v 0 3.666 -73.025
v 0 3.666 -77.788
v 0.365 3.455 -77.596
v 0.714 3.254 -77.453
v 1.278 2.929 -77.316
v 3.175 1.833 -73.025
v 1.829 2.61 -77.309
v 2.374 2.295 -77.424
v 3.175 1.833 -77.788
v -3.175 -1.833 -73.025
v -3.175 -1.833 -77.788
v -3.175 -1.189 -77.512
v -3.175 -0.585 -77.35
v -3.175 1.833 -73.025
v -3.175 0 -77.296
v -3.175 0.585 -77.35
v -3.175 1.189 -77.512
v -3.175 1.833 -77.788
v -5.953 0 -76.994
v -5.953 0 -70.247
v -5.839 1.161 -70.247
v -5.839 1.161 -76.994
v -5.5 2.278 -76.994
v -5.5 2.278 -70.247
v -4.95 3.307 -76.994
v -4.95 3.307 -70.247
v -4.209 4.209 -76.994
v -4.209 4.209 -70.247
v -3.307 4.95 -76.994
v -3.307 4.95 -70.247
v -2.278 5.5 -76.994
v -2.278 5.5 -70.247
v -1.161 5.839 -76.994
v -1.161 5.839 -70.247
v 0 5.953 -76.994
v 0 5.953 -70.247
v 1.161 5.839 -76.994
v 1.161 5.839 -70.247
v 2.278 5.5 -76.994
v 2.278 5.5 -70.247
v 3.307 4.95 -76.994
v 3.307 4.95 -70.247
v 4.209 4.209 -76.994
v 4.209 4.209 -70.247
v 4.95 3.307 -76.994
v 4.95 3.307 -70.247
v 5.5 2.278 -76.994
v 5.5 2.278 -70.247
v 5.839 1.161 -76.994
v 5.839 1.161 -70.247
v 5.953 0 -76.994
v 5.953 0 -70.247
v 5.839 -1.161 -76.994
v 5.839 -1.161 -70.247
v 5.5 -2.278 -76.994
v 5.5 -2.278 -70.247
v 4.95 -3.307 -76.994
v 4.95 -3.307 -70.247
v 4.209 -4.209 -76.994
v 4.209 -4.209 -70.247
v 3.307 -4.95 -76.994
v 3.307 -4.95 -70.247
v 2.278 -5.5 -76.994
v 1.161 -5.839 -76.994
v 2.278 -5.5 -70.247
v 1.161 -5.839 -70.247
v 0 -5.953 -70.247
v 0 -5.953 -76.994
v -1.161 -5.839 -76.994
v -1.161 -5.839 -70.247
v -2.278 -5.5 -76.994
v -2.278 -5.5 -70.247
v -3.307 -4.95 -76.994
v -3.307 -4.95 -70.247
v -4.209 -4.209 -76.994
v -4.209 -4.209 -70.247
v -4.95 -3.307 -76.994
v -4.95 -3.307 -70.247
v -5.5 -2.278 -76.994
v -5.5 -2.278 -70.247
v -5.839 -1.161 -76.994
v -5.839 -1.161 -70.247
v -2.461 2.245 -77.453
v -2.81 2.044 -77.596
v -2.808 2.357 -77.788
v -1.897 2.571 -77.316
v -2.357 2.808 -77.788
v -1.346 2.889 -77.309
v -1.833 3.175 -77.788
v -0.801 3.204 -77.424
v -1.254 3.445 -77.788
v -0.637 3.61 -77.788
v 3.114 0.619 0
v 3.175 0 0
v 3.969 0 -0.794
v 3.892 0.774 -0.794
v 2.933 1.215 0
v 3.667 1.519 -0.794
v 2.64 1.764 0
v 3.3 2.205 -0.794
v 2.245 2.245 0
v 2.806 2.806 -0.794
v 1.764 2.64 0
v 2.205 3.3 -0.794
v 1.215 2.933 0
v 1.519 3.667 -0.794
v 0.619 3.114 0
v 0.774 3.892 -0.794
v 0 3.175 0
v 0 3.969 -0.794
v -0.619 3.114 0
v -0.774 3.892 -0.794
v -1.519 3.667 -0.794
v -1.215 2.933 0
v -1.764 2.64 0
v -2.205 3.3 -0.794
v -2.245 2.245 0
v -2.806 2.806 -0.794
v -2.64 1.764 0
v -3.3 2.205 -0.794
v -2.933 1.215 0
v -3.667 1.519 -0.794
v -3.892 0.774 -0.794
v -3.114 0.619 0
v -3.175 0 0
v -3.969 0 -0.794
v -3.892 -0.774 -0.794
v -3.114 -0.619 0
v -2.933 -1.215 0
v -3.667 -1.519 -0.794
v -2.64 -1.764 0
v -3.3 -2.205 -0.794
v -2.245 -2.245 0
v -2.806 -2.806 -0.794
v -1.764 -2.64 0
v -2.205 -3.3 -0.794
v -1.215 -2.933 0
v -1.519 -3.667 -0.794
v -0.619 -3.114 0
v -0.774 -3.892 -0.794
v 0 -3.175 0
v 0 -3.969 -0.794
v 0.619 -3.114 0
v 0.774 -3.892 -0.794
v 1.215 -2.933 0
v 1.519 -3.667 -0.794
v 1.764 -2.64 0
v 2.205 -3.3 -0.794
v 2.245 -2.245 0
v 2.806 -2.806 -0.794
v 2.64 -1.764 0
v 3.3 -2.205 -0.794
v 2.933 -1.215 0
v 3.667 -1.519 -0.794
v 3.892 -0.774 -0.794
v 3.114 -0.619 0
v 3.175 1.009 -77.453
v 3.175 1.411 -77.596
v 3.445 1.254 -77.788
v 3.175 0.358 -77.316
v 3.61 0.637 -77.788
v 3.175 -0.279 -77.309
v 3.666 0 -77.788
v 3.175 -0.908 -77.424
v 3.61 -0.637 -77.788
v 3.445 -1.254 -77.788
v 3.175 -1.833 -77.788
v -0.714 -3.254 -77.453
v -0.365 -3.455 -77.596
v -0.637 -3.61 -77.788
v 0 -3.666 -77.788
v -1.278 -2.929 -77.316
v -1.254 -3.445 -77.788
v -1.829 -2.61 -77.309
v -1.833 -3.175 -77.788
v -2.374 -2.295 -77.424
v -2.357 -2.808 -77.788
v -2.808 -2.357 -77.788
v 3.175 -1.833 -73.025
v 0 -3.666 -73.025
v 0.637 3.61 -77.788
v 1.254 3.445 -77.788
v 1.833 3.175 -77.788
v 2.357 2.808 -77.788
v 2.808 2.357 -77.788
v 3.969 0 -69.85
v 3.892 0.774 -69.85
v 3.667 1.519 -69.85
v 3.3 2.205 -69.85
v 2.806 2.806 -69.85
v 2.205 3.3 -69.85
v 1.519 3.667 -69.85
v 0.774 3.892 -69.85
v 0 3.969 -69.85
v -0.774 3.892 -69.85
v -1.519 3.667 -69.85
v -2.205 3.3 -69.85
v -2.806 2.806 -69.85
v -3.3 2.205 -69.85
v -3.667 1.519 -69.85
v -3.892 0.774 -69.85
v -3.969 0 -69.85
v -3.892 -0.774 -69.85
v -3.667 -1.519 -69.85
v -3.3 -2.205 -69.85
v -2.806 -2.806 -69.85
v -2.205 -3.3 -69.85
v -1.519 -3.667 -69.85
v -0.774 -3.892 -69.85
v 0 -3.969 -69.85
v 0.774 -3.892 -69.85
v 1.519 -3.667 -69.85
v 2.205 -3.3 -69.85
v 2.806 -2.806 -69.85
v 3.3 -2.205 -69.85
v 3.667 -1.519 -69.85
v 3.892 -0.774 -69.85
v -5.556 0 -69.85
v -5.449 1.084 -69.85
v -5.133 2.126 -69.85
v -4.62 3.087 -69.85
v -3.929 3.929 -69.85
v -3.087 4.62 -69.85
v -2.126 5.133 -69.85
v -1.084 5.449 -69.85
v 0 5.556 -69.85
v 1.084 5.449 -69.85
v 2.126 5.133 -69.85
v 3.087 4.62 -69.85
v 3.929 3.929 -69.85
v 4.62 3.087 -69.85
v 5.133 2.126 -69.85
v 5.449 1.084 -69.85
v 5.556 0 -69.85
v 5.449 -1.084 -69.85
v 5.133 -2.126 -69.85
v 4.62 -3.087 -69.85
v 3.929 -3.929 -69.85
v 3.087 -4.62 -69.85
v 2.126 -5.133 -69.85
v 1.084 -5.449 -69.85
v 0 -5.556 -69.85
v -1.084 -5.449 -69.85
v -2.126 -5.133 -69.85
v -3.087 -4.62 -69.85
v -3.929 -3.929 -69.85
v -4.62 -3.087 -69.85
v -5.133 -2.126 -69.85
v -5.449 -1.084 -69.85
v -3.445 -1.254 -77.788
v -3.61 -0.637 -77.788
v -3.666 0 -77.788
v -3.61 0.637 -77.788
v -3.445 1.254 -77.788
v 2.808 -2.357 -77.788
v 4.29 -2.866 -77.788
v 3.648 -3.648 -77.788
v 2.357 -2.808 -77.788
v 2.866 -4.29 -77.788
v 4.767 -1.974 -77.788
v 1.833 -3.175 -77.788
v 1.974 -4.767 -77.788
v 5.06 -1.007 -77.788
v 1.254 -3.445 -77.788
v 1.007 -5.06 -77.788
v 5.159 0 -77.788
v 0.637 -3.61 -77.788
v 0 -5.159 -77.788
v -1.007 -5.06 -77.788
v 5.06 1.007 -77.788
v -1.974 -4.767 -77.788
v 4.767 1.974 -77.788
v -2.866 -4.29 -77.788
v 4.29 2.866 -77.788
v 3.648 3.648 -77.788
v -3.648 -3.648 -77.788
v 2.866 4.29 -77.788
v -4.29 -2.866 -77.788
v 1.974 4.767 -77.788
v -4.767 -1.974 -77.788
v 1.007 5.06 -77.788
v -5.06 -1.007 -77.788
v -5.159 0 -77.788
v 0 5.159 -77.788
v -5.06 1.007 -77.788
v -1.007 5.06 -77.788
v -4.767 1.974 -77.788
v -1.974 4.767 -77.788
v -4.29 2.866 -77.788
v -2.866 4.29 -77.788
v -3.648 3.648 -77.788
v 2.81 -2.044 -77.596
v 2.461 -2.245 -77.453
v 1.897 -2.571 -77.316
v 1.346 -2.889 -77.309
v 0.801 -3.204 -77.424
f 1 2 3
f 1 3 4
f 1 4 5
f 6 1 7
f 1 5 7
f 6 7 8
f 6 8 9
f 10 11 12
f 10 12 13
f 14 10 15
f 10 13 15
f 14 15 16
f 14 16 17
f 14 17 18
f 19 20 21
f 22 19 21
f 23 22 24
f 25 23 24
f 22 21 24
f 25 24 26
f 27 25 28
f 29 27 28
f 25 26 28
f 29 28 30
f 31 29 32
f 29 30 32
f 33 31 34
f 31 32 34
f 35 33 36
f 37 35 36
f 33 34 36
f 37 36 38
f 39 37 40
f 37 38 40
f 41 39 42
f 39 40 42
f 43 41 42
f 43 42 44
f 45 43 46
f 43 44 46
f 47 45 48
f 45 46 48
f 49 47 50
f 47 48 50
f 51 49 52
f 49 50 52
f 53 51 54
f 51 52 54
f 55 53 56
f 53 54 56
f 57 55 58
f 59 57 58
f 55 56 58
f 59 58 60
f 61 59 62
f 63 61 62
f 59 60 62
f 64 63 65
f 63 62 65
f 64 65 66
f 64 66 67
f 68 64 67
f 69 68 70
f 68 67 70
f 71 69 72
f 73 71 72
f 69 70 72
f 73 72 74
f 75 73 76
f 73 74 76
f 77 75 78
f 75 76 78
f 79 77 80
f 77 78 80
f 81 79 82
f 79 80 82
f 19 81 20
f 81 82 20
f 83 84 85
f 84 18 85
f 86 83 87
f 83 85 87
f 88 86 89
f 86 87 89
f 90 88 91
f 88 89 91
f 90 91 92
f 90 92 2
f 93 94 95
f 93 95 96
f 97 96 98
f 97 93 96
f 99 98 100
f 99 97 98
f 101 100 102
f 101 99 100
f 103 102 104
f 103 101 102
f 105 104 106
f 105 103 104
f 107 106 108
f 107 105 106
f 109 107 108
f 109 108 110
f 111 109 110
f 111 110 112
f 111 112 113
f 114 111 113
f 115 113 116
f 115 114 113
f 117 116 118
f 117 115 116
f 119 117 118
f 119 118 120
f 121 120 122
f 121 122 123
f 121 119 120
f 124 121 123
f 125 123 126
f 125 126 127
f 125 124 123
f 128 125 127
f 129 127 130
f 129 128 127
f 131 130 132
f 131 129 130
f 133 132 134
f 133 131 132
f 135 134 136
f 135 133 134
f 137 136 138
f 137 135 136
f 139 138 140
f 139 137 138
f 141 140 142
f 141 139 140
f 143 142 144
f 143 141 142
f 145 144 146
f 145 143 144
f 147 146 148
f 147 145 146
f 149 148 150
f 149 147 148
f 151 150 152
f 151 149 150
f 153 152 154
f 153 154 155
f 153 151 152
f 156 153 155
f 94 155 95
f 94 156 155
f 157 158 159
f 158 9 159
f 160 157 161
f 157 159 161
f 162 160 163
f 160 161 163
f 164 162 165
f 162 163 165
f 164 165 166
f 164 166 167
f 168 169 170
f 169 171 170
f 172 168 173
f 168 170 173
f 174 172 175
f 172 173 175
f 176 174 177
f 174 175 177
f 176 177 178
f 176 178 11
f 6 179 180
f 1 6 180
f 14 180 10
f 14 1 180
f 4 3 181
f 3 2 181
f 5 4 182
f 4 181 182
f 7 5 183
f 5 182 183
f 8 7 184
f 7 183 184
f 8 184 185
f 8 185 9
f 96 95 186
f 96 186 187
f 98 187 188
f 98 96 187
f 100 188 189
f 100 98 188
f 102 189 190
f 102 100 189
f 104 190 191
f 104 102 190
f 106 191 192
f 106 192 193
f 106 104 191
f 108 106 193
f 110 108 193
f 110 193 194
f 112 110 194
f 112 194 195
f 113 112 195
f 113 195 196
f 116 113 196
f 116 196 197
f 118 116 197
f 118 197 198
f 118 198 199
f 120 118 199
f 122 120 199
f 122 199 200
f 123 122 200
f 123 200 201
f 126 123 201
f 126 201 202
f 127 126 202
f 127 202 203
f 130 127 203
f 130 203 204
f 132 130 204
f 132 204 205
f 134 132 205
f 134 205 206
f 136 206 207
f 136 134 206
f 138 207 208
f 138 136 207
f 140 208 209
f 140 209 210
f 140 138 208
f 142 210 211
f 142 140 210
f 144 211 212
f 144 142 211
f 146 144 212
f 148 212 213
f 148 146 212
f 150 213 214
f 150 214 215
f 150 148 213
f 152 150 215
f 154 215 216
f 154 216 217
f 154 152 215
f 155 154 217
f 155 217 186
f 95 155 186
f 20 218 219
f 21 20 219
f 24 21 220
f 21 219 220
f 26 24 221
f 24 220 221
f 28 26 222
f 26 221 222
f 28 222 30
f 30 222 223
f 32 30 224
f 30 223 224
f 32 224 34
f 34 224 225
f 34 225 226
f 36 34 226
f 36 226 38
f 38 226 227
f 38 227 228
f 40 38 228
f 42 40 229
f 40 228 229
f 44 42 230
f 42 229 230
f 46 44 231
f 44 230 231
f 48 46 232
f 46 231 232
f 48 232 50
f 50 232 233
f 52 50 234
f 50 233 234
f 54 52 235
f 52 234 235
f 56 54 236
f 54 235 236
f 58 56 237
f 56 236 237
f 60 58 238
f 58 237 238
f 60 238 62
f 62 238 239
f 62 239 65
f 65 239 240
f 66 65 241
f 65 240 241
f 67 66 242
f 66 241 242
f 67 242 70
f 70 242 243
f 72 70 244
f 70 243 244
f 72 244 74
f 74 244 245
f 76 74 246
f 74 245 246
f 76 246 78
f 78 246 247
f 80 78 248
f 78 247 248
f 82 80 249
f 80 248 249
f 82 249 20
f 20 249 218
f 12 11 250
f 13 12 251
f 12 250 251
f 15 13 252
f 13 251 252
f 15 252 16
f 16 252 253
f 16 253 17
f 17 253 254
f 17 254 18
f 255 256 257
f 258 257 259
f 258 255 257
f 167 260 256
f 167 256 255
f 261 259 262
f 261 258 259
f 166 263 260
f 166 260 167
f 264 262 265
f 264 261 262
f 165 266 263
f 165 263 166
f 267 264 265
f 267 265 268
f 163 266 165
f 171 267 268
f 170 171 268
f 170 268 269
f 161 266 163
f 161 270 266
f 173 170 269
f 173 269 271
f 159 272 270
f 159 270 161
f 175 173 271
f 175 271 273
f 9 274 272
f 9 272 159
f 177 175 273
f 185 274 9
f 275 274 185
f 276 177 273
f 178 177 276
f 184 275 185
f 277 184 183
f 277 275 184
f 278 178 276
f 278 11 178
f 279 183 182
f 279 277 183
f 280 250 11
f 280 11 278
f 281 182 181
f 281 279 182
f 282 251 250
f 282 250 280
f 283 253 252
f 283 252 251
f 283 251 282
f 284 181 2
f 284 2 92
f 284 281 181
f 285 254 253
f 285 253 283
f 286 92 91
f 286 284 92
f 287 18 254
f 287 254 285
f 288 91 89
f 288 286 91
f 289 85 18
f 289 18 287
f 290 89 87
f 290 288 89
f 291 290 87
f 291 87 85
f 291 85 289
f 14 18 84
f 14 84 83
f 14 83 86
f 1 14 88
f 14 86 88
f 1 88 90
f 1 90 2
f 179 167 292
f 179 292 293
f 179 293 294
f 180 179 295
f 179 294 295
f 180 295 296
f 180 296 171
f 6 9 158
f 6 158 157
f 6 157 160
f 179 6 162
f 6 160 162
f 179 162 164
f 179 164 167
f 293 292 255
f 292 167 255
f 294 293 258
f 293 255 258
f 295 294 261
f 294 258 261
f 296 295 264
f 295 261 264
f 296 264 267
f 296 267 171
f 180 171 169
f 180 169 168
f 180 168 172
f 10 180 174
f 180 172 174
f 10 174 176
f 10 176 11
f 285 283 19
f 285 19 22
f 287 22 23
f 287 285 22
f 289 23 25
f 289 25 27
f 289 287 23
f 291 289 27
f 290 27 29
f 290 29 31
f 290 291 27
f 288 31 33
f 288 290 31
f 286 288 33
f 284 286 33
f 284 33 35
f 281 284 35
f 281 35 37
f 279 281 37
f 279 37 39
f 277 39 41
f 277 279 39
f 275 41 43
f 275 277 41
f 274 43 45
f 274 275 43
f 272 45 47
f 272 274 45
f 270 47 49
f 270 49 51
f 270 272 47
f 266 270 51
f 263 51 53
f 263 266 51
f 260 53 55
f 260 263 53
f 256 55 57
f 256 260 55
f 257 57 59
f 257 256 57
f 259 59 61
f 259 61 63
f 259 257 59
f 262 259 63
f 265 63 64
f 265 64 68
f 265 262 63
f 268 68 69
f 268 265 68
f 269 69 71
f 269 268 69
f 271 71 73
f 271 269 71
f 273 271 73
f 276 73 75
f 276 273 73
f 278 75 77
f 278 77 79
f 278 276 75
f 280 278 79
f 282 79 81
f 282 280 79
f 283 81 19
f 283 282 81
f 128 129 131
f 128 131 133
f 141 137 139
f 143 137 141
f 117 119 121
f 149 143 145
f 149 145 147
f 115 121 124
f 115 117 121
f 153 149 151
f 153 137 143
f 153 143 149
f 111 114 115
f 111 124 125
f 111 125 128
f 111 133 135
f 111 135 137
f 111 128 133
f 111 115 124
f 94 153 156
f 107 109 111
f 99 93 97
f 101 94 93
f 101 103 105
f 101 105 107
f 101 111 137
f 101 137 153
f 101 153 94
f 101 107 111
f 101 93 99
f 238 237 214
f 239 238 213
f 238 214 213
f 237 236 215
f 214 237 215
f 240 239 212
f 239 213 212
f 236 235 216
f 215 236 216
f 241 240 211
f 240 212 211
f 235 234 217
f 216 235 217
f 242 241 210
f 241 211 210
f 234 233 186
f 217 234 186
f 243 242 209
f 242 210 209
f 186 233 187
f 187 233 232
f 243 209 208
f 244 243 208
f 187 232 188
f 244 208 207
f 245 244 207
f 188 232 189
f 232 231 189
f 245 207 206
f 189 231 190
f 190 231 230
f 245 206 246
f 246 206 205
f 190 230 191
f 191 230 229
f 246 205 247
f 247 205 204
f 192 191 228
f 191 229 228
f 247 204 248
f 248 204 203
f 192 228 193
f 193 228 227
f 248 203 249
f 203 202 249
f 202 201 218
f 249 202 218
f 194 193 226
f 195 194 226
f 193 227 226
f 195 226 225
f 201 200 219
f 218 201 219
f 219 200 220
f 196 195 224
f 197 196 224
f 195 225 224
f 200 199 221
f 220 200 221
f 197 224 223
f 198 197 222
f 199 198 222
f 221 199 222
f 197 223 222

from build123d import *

# Parameters (mm, degrees)
SKETCH1_R          = 3.96875
EXTRUDE1_DEPTH     = 69.85
CHAMFER3_SIZE      = 0.79375
SKETCH6_R          = 5.953125
EXTRUDE2_DEPTH     = 7.9375
CUT_EXTRUDE1_DEPTH = 4.7625
SKETCH8_R          = 3.666174209
CUT_EXTRUDE2_DEPTH = 0.79375
CUT_EXTRUDE2_DRAFT = -45
CHAMFER1_SIZE      = 0.79375
CHAMFER2_SIZE      = 0.396875


with BuildPart() as part:
    # Sketch1 → Extrude1 (new body)
    with BuildSketch(Plane.XY):
        Circle(SKETCH1_R)
    extrude(amount=-EXTRUDE1_DEPTH)

    # Chamfer3
    chamfer3_edges = [part.edges().sort_by_distance(p)[0] for p in [
        (-3.96875, 0, 0),
    ]]
    chamfer(chamfer3_edges, length=CHAMFER3_SIZE)

    # Sketch5 → partially thread (revolve)
    with BuildSketch(Plane(origin=(0, 0, 0), x_dir=(0, 0, -1), z_dir=(1, 0, 0))):
        Polygon((69.85, 3.96875), (28.575, 3.96875), (24.60625, 0), (28.575, 0), (69.85, 0), align=None)
    revolve(axis=Axis((0, 0, 0), (0, 0, -1)))

    # Sketch6 → Extrude2 (add)
    with BuildSketch(Plane(origin=(0, 0, -69.85), x_dir=(-1, 0, 0), z_dir=(0, 0, -1))):
        Circle(SKETCH6_R)
    extrude(amount=EXTRUDE2_DEPTH)

    # Sketch7 → Cut-Extrude1 (cut)
    with BuildSketch(Plane(origin=(0, 0, -77.7875), x_dir=(-1, 0, 0), z_dir=(0, 0, -1))):
        Polygon((0, 3.666174209), (-3.175, 1.833087105), (-3.175, -1.833087105), (0, -3.666174209), (3.175, -1.833087105), (3.175, 1.833087105), align=None)
    extrude(amount=-CUT_EXTRUDE1_DEPTH, mode=Mode.SUBTRACT)


with BuildPart() as cut_extrude2_tool:
    # Sketch8 → Cut-Extrude2 (with draft: the straight prism first)
    with BuildSketch(Plane(origin=(0, 0, -77.7875), x_dir=(-1, 0, 0), z_dir=(0, 0, -1))):
        Circle(SKETCH8_R)
    extrude(amount=-CUT_EXTRUDE2_DEPTH)
    # Cut-Extrude2: the draft: its side faces are tilted about the plane it starts from
    cut_extrude2_sides = [cut_extrude2_tool.faces().sort_by_distance(p)[0] for p in [
        (3.666174209, 0, -77.390625),
    ]]
    draft(cut_extrude2_sides, Plane(origin=(0, 0, -77.7875), x_dir=(-1, 0, 0), z_dir=(0, 0, -1)), CUT_EXTRUDE2_DRAFT)


with BuildPart() as part_1:
    add(part.part)

    # Cut-Extrude2: cut by cut_extrude2_tool
    add(cut_extrude2_tool.part, mode=Mode.SUBTRACT)

    # Chamfer1
    chamfer1_edges = [part_1.edges().sort_by_distance(p)[0] for p in [
        (5.953125, 0, -77.7875),
    ]]
    chamfer(chamfer1_edges, length=CHAMFER1_SIZE)

    # Chamfer2
    chamfer2_edges = [part_1.edges().sort_by_distance(p)[0] for p in [
        (5.953125, 0, -69.85),
    ]]
    chamfer(chamfer2_edges, length=CHAMFER2_SIZE)


solid = part_1.part
